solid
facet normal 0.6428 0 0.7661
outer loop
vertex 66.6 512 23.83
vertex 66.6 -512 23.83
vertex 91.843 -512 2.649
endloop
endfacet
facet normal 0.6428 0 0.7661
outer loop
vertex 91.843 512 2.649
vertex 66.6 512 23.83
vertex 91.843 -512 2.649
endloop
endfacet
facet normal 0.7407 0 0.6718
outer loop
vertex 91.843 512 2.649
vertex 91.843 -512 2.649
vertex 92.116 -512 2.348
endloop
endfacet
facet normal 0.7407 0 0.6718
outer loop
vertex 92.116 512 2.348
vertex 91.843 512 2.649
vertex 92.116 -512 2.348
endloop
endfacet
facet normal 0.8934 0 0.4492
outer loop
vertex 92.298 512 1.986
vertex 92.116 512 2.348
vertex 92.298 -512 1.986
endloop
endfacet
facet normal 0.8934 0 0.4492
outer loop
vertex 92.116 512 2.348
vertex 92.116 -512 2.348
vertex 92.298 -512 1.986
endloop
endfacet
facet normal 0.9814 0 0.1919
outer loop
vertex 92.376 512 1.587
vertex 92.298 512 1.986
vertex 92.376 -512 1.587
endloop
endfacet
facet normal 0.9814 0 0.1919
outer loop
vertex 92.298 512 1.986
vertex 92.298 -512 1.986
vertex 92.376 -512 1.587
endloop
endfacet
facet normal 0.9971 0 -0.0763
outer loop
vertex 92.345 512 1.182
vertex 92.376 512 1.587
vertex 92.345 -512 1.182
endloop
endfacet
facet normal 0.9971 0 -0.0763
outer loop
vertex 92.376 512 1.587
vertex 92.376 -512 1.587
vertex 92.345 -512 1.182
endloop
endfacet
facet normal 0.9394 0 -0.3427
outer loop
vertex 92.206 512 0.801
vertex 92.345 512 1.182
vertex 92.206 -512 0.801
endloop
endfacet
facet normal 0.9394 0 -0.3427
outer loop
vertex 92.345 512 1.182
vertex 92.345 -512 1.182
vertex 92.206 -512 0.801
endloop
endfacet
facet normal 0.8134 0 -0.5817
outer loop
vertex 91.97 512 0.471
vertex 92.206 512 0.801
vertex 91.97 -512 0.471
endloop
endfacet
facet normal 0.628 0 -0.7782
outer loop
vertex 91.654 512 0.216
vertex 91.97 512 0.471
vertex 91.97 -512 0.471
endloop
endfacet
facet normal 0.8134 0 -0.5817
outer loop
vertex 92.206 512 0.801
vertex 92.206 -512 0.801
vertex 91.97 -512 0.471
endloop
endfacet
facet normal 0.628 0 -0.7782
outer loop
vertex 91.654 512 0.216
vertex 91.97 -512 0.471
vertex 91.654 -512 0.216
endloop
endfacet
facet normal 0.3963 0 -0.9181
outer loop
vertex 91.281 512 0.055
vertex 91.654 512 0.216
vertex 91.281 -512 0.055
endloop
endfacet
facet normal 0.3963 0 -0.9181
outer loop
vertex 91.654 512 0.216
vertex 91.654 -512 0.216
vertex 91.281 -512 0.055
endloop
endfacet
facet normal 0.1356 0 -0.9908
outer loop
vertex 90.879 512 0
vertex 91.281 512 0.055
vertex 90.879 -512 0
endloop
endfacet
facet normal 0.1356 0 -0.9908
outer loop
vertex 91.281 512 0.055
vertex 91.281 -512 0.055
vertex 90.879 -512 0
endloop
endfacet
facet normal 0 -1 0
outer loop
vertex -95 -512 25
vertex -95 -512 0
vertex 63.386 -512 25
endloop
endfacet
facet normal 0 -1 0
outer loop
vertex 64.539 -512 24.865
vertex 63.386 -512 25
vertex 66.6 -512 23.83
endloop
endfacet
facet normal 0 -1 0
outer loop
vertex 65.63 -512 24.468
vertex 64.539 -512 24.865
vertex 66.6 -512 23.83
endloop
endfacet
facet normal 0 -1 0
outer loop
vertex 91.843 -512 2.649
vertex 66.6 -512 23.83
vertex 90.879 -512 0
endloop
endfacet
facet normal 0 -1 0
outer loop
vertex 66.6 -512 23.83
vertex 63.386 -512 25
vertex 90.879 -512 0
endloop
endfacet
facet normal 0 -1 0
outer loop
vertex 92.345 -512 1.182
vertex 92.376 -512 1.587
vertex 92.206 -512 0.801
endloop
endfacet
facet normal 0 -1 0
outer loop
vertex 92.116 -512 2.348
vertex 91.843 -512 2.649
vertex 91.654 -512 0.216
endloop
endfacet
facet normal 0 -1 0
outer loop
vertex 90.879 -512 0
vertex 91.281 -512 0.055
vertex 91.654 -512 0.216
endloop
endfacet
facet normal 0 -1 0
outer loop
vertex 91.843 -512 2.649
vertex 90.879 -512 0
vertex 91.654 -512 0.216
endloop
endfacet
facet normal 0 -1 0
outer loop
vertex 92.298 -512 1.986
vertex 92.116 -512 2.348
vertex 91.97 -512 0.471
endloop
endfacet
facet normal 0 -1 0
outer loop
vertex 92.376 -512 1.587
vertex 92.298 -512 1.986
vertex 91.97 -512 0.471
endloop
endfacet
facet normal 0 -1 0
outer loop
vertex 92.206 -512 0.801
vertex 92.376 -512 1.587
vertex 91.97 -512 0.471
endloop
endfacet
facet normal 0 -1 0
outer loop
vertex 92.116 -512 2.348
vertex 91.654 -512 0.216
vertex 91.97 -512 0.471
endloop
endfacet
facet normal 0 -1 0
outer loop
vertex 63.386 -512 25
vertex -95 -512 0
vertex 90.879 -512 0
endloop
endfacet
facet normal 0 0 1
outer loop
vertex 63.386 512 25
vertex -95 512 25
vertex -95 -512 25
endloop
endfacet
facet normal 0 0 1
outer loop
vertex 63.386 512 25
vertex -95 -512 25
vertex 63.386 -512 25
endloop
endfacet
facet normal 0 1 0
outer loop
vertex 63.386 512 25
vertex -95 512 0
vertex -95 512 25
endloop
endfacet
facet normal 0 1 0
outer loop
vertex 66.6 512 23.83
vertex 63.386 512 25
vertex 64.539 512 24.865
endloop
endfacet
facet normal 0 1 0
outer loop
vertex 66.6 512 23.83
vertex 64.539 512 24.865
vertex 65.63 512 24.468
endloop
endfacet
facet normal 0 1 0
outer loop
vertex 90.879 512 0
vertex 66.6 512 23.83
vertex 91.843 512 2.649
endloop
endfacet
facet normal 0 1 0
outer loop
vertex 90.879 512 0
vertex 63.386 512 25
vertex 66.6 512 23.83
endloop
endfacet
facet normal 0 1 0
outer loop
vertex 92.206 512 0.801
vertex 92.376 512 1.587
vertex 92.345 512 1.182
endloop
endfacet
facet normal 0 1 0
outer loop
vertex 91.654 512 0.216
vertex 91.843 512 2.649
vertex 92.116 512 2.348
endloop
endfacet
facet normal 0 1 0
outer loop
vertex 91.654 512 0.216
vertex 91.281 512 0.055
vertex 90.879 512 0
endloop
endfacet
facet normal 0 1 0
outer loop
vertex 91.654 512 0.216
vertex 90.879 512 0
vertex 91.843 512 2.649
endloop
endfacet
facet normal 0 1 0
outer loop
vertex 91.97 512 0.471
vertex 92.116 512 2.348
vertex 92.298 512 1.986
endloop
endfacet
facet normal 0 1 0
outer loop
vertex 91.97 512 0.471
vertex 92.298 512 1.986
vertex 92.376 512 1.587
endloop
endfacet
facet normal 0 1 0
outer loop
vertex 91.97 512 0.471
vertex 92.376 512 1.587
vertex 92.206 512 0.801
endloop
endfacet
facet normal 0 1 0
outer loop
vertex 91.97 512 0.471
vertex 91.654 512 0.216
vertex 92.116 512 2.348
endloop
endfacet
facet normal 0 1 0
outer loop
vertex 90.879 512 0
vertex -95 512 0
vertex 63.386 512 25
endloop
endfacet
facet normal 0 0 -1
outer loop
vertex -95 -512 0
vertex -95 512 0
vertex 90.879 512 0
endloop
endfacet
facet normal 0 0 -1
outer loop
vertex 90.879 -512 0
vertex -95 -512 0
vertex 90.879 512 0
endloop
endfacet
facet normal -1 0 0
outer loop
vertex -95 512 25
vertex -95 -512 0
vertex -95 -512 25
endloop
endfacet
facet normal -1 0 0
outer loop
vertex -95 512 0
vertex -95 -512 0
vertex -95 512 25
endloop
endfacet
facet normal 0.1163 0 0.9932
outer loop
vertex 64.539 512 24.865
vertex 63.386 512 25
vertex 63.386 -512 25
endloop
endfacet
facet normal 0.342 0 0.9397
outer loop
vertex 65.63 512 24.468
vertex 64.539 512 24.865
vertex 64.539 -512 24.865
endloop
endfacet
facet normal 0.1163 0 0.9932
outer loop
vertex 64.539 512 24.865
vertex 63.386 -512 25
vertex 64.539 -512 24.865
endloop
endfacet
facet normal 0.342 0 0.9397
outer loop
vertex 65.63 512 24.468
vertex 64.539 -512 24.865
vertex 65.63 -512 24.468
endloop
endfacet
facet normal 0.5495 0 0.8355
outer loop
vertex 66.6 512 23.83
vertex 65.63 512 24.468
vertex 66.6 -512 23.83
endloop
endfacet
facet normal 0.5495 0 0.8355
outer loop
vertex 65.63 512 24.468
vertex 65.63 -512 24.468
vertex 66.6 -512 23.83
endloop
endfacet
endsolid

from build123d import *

# Parameters (mm, degrees)
F0_W     = 190
F0_H     = 1024
F1_DEPTH = 25
F3_DEPTH = 1024


with BuildPart() as f1:
    # F0 (on Top) → F1 (new body)
    with BuildSketch(Plane.XY):
        Rectangle(F0_W, F0_H)
    extrude(amount=F1_DEPTH)

    # F2 (on face) → F3 (cut)
    with BuildSketch(Plane.XZ.offset(512)):
        with BuildLine():
            ThreePointArc((63.386309, 25), (65.09641, 24.698463), (66.600247, 23.830222))
            Line((66.600247, 23.830222), (91.842965, 2.649067))
            ThreePointArc((91.842965, 2.649067), (92.288323, 0.98697), (90.878784, 0))
            Line((90.878784, 0), (95, 0))
            Line((95, 0), (95, 25))
            Line((95, 25), (65.20616, 25))
            Line((65.20616, 25), (63.386309, 25))
        make_face()
    extrude(amount=-F3_DEPTH, mode=Mode.SUBTRACT)


solid = f1.part
